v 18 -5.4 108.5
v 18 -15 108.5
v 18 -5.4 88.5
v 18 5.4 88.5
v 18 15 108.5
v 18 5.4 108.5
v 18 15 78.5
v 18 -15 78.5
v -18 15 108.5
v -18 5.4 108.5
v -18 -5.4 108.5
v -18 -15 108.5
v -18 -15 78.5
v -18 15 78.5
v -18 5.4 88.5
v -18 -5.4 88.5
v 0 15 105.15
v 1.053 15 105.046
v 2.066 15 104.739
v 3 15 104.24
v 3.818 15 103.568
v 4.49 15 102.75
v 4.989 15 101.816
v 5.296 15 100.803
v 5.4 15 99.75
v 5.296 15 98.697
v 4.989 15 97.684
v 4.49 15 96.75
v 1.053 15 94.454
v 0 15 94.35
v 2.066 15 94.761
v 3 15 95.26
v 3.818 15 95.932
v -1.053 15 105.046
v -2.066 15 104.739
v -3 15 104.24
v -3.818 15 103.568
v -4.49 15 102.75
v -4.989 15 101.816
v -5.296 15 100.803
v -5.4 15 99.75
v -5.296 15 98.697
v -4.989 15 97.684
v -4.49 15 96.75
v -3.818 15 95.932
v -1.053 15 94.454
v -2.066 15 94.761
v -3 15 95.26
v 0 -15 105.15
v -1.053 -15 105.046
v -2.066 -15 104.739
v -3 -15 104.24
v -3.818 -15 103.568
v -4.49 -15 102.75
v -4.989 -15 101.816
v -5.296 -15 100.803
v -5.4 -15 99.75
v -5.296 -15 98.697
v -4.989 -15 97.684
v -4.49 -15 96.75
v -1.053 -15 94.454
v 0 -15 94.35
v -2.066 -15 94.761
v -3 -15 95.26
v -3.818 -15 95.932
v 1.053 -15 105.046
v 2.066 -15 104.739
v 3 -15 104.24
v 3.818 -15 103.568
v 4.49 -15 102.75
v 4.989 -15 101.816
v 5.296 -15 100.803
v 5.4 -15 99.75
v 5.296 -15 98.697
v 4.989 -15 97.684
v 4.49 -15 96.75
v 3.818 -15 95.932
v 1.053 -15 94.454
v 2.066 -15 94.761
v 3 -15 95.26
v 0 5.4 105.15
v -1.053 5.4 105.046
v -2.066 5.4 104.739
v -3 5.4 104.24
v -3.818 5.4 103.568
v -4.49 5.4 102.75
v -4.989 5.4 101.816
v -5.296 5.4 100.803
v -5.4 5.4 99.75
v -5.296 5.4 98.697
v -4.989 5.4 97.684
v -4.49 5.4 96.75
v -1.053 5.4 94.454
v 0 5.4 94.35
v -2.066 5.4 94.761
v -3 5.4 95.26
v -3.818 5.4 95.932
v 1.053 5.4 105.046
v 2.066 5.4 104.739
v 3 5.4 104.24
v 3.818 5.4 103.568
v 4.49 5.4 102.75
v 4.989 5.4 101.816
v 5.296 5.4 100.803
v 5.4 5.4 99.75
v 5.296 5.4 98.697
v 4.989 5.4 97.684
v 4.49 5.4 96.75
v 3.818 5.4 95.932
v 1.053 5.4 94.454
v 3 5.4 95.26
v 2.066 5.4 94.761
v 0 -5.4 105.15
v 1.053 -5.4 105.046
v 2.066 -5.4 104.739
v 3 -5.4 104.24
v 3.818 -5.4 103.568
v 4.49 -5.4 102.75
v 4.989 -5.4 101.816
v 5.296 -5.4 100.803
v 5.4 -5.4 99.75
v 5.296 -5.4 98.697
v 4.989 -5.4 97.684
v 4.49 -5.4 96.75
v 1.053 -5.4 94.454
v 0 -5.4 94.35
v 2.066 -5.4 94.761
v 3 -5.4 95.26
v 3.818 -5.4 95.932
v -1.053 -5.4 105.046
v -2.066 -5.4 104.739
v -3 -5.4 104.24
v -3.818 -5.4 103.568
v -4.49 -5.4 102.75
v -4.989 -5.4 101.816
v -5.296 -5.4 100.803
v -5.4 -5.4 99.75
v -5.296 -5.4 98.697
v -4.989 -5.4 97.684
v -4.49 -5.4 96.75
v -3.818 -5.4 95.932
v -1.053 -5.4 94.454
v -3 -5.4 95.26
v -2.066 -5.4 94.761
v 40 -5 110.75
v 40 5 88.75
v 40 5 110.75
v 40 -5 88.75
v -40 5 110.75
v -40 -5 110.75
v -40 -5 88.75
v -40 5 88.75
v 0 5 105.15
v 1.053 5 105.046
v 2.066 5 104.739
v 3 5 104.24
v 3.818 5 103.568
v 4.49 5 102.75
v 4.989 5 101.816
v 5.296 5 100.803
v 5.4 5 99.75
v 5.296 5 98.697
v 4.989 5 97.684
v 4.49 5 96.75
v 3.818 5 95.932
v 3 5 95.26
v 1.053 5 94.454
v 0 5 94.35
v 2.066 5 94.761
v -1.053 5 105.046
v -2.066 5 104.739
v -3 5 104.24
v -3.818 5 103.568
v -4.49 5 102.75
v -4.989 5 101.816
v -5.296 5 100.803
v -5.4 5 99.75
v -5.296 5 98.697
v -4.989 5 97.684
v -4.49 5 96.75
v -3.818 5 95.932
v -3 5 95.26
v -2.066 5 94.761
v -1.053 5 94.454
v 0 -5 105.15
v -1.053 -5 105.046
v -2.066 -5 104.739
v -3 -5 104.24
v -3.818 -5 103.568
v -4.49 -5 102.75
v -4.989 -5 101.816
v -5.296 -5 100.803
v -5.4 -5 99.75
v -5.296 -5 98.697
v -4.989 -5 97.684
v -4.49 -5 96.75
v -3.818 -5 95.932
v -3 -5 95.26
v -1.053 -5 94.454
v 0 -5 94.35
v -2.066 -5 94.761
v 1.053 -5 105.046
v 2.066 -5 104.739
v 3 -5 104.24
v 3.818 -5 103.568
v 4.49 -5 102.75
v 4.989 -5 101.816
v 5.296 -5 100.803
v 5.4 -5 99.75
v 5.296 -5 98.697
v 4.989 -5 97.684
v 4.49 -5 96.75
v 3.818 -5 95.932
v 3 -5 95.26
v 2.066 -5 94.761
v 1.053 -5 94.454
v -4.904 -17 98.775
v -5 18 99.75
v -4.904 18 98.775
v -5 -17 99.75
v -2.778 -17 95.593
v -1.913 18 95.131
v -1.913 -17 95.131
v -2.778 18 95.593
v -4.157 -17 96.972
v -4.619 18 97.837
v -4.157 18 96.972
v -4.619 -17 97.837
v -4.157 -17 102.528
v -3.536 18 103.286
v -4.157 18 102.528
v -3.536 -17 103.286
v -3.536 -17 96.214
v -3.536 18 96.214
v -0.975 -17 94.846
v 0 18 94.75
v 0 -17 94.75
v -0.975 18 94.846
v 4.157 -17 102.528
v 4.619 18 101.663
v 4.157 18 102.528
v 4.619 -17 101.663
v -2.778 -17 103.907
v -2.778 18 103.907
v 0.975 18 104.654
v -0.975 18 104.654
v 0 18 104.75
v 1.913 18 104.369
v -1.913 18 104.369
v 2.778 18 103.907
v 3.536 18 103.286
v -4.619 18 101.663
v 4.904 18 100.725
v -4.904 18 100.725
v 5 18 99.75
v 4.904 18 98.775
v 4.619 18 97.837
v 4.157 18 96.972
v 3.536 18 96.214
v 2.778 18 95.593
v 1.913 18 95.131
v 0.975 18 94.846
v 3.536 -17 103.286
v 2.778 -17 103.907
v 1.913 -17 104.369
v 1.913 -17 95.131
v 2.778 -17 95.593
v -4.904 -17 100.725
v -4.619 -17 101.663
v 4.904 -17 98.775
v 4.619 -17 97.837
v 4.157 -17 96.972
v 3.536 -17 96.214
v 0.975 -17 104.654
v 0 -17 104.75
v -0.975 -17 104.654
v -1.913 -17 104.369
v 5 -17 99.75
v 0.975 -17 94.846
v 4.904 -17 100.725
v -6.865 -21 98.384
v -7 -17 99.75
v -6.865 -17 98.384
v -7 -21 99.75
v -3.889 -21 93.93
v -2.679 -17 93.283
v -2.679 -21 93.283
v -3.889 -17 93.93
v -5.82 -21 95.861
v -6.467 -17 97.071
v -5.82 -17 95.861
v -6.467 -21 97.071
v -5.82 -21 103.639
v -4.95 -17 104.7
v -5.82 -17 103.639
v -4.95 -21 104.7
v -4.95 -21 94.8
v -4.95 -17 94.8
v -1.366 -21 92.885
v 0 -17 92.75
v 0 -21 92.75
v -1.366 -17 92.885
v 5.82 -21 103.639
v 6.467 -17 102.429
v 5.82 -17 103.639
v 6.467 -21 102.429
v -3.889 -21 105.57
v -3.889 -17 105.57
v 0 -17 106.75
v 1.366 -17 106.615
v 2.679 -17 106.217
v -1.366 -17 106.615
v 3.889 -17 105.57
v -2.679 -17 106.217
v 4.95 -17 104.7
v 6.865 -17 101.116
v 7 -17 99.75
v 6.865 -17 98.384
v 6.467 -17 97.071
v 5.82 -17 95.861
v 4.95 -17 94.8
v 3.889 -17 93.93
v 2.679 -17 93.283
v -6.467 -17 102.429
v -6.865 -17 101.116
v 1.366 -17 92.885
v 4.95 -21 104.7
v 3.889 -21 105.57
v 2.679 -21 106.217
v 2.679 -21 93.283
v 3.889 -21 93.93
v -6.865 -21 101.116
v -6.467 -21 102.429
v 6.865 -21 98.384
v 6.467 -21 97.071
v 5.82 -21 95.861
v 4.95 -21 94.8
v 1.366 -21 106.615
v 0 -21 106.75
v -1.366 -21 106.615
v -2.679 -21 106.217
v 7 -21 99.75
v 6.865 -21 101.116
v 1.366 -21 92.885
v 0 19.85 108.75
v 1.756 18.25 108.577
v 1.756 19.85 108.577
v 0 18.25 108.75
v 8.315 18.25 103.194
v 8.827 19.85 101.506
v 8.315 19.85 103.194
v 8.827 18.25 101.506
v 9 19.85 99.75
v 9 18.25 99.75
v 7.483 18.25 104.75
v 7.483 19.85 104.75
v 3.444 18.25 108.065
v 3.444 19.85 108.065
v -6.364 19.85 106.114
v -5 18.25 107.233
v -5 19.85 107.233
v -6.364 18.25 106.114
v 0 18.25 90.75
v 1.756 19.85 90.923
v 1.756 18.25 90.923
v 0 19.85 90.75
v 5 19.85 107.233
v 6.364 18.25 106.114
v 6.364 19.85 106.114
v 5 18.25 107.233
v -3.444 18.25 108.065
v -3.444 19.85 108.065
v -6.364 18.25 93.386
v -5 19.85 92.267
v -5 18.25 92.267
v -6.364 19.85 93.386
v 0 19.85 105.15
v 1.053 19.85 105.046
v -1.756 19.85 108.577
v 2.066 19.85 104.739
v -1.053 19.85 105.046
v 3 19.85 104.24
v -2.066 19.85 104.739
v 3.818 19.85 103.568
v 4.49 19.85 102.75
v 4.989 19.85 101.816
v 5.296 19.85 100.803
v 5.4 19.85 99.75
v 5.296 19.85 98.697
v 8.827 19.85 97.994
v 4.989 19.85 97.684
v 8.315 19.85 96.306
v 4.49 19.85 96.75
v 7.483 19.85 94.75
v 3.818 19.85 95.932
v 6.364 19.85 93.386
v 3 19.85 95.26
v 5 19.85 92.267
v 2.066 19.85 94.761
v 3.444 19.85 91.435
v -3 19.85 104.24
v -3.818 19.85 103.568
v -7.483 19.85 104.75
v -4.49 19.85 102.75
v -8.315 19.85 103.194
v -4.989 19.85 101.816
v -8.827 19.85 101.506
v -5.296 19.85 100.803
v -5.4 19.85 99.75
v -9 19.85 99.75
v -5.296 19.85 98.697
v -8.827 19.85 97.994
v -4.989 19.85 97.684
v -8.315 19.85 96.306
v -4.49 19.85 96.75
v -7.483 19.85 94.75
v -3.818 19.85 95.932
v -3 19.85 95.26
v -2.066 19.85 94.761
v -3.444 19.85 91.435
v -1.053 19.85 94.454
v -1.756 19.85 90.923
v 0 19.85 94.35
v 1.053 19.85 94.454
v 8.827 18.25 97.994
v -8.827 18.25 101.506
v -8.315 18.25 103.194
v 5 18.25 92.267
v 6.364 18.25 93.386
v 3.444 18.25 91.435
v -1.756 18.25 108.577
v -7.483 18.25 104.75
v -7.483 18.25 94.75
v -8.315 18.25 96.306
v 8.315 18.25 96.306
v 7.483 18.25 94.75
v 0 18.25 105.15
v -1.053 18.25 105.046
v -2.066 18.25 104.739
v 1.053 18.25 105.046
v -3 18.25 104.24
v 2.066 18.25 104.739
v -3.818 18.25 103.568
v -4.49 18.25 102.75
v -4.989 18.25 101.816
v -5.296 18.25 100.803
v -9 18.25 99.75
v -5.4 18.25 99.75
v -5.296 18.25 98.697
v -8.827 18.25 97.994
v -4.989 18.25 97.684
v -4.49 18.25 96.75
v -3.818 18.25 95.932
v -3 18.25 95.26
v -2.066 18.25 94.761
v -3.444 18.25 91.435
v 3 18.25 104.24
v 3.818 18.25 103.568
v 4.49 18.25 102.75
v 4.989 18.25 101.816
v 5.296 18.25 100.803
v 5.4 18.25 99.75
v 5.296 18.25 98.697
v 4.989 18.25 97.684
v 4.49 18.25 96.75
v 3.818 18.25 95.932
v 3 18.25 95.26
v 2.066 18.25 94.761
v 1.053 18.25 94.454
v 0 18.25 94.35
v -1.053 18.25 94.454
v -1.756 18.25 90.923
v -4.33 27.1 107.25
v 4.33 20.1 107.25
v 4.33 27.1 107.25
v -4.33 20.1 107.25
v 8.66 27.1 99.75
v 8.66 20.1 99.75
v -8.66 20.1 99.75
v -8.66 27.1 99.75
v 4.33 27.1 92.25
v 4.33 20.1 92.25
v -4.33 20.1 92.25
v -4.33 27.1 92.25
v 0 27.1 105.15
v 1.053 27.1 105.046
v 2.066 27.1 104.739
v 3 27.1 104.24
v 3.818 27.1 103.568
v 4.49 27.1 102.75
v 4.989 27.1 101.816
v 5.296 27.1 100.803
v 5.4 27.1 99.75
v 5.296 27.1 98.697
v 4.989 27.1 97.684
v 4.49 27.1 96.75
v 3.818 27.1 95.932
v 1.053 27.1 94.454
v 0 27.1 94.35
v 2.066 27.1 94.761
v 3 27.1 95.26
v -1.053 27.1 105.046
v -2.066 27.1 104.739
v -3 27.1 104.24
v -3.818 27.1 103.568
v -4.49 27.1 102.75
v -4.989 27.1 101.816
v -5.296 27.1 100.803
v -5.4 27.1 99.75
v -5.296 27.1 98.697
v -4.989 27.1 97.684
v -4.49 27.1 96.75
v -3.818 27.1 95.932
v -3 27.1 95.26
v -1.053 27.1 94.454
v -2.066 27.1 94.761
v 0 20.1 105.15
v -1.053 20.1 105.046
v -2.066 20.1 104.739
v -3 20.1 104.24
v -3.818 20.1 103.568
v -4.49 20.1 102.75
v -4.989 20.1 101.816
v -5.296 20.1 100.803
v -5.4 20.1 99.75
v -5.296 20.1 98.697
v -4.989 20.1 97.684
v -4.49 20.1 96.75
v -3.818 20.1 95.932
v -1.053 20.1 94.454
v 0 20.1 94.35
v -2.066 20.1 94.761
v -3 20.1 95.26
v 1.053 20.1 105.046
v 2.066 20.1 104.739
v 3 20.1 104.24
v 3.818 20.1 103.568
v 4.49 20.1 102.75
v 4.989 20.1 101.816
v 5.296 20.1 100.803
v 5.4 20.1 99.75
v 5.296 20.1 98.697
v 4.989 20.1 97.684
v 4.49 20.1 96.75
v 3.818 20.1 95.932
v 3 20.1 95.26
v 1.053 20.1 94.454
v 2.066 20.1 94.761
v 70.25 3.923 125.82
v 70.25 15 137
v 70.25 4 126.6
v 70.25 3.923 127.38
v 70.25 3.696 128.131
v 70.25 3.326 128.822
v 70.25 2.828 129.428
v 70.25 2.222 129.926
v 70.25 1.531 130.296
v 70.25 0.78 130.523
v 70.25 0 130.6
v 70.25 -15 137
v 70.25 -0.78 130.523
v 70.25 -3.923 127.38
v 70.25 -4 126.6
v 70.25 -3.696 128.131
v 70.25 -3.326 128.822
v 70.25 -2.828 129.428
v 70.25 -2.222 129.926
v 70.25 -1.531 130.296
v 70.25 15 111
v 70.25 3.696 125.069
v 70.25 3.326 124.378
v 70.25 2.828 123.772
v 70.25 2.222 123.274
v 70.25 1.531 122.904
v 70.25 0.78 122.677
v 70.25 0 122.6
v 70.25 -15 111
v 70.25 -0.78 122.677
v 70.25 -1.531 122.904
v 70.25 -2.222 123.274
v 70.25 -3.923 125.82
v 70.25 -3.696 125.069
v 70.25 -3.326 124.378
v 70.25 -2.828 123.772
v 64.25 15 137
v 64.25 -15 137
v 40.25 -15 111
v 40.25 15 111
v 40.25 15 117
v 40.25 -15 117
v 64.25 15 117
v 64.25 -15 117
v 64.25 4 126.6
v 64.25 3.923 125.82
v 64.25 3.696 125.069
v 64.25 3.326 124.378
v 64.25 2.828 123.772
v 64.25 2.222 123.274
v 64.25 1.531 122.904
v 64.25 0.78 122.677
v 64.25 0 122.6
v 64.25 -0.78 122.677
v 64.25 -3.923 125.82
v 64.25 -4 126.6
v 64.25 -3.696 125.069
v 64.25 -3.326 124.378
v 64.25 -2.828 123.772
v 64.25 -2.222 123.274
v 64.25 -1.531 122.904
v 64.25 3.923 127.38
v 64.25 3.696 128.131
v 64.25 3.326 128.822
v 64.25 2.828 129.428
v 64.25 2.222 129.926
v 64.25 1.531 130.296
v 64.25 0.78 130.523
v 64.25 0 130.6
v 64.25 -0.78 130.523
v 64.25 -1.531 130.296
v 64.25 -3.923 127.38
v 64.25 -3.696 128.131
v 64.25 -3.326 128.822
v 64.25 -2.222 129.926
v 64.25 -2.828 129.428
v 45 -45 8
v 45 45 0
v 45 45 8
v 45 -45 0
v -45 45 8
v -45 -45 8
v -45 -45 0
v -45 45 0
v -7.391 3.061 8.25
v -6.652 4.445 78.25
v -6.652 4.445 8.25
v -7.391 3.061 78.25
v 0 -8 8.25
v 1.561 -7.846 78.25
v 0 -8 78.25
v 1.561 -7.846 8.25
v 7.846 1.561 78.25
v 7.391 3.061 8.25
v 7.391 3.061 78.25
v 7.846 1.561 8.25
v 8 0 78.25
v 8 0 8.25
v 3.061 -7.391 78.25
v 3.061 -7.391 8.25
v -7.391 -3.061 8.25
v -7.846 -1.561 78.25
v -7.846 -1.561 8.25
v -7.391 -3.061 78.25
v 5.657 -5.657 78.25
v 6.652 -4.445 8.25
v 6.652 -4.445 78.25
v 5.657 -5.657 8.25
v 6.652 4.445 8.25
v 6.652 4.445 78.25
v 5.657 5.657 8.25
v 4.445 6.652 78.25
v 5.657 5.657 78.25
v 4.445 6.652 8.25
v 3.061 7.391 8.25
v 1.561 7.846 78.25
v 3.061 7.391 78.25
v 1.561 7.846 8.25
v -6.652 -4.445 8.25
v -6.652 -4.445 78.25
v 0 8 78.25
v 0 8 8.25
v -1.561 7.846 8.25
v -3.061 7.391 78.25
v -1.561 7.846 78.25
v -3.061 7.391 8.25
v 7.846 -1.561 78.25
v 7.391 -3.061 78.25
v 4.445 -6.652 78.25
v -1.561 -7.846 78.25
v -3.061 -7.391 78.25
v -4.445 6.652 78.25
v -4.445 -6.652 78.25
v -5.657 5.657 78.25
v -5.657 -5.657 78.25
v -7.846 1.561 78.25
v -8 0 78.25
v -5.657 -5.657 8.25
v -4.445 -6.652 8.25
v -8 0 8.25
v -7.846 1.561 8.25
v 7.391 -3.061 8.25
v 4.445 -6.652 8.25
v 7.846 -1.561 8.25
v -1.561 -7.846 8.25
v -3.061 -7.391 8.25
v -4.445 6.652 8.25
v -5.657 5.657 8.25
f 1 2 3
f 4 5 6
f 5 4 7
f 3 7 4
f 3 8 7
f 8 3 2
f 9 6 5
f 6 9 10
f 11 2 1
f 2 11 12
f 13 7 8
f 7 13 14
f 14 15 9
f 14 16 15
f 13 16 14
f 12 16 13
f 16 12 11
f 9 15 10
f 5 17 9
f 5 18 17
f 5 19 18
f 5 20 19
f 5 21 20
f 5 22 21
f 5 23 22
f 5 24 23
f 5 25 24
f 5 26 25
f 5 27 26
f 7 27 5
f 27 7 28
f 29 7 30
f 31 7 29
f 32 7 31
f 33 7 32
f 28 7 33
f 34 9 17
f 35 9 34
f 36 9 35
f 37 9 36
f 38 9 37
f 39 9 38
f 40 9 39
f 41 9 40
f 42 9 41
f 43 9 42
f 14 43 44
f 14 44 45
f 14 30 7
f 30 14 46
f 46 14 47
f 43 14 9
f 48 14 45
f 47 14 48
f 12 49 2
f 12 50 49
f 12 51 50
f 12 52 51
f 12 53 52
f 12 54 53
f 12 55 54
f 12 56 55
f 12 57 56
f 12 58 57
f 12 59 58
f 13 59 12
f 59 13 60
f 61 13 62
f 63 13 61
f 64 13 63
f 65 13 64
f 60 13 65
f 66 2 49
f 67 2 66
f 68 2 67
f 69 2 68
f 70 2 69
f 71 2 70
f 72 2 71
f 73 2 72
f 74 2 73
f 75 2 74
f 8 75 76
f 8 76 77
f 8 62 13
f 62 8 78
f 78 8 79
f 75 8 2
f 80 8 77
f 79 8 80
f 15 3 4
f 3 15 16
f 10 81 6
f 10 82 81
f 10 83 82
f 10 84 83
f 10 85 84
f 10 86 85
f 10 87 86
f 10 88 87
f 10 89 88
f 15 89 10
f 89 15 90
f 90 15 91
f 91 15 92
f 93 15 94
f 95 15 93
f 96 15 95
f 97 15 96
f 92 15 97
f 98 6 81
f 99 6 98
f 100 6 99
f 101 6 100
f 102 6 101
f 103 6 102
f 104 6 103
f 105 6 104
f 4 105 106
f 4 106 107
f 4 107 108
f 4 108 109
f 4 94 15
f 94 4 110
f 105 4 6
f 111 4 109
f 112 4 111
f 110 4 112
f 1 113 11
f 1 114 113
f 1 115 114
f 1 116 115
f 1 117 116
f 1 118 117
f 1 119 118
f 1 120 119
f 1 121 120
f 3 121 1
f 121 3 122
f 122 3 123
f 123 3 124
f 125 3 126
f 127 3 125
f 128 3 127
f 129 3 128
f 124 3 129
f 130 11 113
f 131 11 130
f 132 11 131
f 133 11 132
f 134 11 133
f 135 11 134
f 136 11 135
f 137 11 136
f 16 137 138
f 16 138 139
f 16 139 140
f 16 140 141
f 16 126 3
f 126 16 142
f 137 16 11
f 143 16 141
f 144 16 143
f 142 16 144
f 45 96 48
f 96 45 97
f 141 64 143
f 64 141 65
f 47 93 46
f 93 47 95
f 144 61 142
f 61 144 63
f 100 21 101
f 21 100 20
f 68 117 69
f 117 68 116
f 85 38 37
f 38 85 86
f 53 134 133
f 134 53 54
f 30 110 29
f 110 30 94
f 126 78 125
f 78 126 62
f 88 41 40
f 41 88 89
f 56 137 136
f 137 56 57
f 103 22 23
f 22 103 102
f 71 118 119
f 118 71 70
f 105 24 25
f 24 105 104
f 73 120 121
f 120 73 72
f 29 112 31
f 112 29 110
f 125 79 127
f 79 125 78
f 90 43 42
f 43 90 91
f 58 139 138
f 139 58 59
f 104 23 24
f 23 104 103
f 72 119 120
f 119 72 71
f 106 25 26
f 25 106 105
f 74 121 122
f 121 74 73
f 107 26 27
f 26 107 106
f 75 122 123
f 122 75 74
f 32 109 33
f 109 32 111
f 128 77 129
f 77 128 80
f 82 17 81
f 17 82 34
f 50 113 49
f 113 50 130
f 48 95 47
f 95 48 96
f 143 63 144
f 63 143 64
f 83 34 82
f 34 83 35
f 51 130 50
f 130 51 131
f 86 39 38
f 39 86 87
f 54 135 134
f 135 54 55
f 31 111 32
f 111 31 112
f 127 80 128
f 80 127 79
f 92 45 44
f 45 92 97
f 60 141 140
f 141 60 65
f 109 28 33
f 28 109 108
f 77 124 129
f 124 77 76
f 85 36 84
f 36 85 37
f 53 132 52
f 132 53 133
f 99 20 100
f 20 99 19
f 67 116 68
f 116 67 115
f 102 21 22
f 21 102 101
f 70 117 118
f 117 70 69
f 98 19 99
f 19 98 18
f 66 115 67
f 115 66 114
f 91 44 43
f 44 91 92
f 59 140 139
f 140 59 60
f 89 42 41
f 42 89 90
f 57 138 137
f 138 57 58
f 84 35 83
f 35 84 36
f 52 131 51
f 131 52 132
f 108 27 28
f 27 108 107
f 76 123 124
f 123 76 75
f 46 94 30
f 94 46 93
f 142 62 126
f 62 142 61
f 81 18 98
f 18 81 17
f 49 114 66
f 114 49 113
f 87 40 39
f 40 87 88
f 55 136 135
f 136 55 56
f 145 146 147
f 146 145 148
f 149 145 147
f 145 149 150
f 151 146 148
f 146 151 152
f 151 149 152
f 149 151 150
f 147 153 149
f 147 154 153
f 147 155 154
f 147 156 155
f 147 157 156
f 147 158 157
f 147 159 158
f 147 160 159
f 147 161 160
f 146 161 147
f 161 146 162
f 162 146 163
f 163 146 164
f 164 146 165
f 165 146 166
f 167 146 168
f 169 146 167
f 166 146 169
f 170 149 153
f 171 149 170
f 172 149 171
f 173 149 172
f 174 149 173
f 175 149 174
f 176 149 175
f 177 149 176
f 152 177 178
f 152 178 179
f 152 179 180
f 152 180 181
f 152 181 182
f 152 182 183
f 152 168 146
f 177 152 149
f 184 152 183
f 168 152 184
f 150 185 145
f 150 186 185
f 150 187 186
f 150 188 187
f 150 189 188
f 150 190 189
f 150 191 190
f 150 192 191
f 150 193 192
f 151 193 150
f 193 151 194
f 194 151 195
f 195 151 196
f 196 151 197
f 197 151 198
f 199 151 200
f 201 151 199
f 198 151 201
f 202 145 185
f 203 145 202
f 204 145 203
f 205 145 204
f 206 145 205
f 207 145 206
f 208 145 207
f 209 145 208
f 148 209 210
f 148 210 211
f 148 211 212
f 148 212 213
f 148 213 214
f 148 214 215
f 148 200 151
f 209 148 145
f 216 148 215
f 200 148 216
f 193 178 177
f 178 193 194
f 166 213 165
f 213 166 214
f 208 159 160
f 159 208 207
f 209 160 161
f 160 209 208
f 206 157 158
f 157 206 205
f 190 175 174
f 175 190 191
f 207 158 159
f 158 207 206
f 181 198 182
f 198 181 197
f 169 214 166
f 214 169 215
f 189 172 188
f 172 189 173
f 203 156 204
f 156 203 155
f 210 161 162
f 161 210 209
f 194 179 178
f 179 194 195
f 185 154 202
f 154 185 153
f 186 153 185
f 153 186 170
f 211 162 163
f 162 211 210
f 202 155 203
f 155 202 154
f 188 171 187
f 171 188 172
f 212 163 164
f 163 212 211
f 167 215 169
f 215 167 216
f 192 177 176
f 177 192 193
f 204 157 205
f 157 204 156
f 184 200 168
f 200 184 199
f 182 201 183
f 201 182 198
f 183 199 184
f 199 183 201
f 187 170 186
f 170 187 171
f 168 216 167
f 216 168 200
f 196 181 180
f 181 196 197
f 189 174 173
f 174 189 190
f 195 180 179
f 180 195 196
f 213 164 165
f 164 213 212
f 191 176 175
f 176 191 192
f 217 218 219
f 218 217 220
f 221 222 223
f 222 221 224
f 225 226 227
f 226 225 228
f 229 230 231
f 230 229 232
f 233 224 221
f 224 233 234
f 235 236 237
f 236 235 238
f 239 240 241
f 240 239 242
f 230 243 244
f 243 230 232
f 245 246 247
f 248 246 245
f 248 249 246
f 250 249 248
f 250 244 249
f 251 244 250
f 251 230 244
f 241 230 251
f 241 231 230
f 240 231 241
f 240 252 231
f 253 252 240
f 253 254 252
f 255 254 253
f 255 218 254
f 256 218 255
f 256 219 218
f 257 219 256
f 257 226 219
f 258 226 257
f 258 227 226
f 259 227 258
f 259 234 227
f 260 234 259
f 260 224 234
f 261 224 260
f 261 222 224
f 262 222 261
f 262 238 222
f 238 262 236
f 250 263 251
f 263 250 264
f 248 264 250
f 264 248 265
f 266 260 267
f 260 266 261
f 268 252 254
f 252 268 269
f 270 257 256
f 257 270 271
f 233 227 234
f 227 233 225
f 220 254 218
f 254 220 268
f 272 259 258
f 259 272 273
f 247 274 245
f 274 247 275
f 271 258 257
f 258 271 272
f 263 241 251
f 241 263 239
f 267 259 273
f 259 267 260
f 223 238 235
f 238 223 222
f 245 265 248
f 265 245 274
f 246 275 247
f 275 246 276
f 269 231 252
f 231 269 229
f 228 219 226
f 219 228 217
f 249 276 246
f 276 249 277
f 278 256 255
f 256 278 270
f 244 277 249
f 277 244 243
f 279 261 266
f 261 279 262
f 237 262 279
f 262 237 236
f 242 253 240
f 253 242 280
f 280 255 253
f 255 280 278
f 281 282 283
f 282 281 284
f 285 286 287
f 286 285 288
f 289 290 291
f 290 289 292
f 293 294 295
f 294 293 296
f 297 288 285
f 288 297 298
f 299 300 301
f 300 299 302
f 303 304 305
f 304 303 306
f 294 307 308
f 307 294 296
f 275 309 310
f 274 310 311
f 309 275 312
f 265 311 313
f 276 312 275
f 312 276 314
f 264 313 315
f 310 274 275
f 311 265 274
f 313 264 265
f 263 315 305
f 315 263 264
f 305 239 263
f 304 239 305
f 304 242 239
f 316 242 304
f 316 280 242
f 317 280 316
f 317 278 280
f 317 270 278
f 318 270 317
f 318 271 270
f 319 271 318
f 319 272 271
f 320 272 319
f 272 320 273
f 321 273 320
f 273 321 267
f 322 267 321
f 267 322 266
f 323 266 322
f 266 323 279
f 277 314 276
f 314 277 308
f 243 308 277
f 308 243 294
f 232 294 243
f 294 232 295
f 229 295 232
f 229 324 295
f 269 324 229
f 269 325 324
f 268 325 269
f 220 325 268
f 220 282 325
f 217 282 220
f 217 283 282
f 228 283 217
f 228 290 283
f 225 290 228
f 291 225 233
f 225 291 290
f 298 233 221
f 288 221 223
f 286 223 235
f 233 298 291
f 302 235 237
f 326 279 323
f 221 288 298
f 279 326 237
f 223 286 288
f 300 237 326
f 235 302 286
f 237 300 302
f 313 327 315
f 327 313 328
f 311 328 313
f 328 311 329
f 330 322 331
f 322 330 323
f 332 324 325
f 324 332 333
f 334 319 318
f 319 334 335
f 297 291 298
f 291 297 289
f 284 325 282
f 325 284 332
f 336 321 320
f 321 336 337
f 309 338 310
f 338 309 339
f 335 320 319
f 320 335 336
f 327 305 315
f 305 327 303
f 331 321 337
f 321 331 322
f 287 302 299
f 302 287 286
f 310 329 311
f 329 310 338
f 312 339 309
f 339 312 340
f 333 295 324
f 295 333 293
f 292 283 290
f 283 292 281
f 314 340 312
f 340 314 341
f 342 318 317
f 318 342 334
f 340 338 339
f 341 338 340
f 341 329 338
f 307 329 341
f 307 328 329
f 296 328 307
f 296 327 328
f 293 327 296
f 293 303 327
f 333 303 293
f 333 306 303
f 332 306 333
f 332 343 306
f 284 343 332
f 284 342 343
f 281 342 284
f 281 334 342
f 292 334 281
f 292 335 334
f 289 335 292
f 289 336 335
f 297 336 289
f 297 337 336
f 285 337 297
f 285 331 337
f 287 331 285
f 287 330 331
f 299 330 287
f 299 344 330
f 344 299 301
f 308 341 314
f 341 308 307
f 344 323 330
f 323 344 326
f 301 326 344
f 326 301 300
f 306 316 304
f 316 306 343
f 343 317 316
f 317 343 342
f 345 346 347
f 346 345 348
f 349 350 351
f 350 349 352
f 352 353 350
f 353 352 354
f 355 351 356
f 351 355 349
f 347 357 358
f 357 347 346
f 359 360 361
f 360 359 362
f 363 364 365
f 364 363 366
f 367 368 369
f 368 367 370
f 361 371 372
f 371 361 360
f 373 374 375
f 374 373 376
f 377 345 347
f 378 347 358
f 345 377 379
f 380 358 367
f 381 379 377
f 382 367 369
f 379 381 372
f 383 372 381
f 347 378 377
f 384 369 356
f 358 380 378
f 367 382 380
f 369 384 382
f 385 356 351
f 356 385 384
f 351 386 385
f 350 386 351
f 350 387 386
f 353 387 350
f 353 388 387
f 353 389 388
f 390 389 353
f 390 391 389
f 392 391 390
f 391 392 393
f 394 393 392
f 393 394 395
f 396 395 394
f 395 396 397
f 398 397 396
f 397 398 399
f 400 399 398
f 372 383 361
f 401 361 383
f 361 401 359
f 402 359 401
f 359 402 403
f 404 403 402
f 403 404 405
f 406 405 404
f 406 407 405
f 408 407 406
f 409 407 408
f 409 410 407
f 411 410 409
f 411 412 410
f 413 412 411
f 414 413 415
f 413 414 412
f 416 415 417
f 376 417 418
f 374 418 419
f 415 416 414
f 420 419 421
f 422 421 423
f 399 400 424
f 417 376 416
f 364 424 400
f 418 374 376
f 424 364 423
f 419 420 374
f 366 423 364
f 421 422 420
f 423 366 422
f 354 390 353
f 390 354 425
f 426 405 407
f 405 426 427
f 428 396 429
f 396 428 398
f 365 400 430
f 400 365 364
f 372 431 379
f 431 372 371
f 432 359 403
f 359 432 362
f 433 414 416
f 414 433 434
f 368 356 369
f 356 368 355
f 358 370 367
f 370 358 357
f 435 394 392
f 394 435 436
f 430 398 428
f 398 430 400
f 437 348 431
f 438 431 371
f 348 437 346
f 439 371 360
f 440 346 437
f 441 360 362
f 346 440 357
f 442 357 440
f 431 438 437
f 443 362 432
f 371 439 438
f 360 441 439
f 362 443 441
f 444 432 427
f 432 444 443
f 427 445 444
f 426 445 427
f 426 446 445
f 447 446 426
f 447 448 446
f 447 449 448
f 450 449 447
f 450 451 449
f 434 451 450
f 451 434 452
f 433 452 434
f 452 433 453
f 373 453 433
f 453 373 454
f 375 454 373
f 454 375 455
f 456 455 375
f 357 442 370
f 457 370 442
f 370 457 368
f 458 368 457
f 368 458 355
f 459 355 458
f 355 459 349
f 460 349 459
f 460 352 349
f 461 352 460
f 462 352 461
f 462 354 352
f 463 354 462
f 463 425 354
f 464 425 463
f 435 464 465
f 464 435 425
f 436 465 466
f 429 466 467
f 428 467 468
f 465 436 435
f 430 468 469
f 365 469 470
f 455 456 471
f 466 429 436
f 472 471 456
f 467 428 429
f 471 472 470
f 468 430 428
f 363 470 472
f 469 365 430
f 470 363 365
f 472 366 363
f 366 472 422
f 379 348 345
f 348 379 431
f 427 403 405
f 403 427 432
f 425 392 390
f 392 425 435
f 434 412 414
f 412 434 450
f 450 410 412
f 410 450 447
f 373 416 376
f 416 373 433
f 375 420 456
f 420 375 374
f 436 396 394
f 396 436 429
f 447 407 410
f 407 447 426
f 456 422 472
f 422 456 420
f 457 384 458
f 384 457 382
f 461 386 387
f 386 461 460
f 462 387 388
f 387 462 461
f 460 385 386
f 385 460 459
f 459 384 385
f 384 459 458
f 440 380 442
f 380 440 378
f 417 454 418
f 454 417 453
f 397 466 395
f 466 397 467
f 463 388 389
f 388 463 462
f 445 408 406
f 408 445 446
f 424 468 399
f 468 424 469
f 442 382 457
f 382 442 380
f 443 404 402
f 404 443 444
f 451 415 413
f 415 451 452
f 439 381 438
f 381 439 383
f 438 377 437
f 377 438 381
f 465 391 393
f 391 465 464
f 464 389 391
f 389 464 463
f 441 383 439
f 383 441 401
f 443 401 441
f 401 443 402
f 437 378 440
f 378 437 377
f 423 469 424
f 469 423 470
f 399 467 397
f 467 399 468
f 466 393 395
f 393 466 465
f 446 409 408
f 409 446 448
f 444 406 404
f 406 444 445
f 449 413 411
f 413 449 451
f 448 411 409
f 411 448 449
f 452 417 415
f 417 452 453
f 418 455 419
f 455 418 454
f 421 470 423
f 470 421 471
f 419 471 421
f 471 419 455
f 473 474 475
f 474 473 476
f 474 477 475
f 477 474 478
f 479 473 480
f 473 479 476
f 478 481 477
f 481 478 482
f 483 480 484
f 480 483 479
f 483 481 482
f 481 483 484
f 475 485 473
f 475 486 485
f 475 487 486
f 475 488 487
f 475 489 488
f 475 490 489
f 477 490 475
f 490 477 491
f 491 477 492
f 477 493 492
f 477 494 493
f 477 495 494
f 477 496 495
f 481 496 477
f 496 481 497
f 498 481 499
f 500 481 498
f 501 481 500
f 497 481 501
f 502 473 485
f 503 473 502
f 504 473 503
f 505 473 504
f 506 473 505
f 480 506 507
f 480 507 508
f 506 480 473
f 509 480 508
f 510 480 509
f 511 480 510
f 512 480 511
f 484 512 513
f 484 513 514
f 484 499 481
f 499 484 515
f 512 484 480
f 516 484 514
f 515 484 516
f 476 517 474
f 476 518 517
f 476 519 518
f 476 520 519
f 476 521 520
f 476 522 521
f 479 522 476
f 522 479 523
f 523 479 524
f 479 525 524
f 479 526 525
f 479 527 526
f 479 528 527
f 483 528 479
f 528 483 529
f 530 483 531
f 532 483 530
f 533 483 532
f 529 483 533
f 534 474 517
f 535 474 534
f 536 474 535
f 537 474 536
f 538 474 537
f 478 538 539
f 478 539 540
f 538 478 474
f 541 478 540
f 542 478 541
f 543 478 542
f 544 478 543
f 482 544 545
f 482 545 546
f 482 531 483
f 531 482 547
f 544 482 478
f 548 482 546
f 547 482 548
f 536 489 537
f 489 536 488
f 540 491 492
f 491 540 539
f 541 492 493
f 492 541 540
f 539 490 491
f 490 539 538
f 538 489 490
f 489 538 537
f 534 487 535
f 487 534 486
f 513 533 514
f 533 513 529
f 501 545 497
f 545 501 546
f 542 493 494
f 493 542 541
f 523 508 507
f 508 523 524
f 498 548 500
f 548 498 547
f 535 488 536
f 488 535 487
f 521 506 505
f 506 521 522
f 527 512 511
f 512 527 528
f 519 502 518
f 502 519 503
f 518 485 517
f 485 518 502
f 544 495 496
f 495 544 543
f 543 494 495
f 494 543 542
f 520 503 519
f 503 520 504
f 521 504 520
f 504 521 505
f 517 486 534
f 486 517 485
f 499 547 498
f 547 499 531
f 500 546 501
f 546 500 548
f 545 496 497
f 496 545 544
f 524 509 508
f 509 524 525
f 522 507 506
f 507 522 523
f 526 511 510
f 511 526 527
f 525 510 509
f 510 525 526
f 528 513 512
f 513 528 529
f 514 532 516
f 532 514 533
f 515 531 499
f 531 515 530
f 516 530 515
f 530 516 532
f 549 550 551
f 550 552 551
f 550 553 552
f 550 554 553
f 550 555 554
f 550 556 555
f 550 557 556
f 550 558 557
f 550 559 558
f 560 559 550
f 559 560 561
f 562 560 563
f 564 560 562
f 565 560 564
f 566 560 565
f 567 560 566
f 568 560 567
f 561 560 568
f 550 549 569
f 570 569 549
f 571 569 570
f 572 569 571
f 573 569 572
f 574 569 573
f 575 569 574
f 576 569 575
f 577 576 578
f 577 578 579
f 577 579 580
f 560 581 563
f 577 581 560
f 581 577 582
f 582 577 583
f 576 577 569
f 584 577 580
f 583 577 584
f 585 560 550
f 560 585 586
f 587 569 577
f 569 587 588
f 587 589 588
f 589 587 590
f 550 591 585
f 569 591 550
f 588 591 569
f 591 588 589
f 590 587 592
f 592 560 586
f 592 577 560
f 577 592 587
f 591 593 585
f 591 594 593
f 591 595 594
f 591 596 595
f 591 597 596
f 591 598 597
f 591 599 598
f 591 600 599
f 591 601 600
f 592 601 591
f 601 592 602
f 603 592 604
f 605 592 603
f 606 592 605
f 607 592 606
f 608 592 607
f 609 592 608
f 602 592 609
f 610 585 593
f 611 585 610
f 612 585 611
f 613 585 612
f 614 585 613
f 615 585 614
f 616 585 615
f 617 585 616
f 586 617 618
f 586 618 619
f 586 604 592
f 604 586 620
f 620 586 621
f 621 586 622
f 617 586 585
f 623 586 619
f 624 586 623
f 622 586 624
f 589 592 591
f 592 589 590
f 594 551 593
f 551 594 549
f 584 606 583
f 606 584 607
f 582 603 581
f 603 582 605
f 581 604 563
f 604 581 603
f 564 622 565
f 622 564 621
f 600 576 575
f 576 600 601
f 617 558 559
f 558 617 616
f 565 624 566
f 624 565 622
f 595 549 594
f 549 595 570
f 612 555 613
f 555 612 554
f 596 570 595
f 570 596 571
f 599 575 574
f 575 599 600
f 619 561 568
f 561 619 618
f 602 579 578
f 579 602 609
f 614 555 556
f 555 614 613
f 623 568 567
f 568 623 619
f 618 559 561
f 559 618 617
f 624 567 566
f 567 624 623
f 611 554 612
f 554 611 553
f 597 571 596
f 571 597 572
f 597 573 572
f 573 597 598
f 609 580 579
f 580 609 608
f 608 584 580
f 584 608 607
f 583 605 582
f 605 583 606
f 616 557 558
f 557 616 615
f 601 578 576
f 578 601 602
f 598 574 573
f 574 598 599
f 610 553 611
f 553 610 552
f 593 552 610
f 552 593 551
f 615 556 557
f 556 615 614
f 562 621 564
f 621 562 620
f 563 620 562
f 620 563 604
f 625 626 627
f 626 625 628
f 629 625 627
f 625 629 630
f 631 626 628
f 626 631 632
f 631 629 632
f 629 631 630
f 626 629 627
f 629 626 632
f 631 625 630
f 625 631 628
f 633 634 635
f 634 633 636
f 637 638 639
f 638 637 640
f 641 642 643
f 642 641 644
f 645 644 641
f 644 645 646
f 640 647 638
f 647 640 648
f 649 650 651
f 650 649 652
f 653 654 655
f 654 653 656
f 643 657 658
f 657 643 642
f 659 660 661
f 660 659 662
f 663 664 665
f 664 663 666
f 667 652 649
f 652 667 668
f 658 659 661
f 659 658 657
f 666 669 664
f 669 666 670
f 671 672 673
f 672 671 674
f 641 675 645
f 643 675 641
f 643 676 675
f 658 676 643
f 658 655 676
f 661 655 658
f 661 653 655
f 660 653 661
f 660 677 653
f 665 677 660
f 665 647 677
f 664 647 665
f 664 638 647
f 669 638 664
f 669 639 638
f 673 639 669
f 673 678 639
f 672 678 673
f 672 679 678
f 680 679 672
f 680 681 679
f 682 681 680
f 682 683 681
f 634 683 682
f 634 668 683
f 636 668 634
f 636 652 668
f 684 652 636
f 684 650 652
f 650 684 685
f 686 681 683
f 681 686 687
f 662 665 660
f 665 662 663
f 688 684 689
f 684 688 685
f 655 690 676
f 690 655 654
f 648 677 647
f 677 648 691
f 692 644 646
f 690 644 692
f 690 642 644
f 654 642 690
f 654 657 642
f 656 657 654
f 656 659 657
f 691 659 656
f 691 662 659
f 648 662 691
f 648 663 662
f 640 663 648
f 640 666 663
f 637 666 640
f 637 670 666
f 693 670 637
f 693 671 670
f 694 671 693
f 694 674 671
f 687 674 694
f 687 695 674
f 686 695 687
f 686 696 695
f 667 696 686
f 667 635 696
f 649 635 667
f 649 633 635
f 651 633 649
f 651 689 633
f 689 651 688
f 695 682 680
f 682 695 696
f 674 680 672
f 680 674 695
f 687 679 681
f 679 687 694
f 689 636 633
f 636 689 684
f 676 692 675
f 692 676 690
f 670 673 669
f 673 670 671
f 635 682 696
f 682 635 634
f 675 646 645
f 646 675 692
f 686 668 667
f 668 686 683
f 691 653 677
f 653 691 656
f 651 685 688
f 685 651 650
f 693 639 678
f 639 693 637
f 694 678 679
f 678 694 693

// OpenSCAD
$fn = 32;

// ------------------------------------------------------------------------
// Lamp arm: column d16 x 70 mm, arm 80 mm
// Every part is its own module, assembly() places every instance.
// ------------------------------------------------------------------------

// --- part 1 ---
module lamp_base() {
  difference() {
    translate([-45, -45, 0]) cube([90, 90, 8]);
  }
}

// --- part 2 ---
module lamp_column() {
  cylinder(h = 70, d = 16);
}

// --- part 3 ---
module head_fork() {
  difference() {
    translate([-18, -15, 0]) cube([36, 30, 30]);
    translate([-19, -5.4, 10]) cube([38, 10.8, 21]);
    translate([0, 0, 21.25]) rotate([90, 0, 0]) cylinder(h = 32, d = 10.8, center = true);
  }
}

// --- part 4 ---
module lamp_arm() {
  difference() {
    translate([-40, -5, 0]) cube([80, 10, 22]);
    translate([0, 0, 11]) rotate([90, 0, 0]) cylinder(h = 12, d = 10.8, center = true);
  }
}

// --- part 5 ---
module arm_pin() {
  rotate([0, 90, 0]) cylinder(h = 36, d = 10, center = true);
  translate([-21, 0, 0]) rotate([0, 90, 0]) cylinder(h = 4, d = 14);
}

// --- part 6 ---
module arm_washer() {
  difference() {
      translate([0, 0, 0]) cylinder(h = 1.6, d = 18);
      translate([0, 0, -1]) cylinder(h = 3.6, d = 10.8);
    }
}

// --- part 7 ---
module arm_nut() {
  difference() {
    linear_extrude(height = 7) polygon(points = [[8.66, 0], [4.33, 7.5], [-4.33, 7.5], [-8.66, 0], [-4.33, -7.5], [4.33, -7.5]]);
    translate([0, 0, -1]) cylinder(h = 9, d = 10.8);
  }
}

// --- part 8 ---
module shade_bracket() {
  difference() {
    translate([-15, -15, 0]) cube([30, 30, 26]);
    translate([-16, -16, 6]) cube([25, 32, 21]);
    translate([12, 0, 15.6]) rotate([0, 90, 0]) cylinder(h = 8, d = 8, center = true);
  }
}

// --- assembly ---
module assembly() {
  color([0.80, 0.24, 0.20]) translate([0, 0, 0]) rotate([0, 0, 0]) lamp_base();
  color([0.20, 0.45, 0.75]) translate([0, 0, 8.25]) rotate([0, 0, 0]) lamp_column();
  color([0.25, 0.62, 0.32]) translate([0, 0, 78.5]) rotate([0, 0, 0]) head_fork();
  color([0.92, 0.70, 0.18]) translate([0, 0, 88.75]) rotate([0, 0, 0]) lamp_arm();
  color([0.58, 0.35, 0.70]) translate([0, 0, 99.75]) rotate([0, 0, 90]) arm_pin();
  color([0.16, 0.66, 0.66]) translate([0, 19.85, 99.75]) rotate([90, 0, 0]) arm_washer();
  color([0.85, 0.48, 0.18]) translate([0, 27.1, 99.75]) rotate([90, 0, 0]) arm_nut();
  color([0.55, 0.60, 0.65]) translate([55.25, 0, 111]) rotate([0, 0, 0]) shade_bracket();
}

assembly();
